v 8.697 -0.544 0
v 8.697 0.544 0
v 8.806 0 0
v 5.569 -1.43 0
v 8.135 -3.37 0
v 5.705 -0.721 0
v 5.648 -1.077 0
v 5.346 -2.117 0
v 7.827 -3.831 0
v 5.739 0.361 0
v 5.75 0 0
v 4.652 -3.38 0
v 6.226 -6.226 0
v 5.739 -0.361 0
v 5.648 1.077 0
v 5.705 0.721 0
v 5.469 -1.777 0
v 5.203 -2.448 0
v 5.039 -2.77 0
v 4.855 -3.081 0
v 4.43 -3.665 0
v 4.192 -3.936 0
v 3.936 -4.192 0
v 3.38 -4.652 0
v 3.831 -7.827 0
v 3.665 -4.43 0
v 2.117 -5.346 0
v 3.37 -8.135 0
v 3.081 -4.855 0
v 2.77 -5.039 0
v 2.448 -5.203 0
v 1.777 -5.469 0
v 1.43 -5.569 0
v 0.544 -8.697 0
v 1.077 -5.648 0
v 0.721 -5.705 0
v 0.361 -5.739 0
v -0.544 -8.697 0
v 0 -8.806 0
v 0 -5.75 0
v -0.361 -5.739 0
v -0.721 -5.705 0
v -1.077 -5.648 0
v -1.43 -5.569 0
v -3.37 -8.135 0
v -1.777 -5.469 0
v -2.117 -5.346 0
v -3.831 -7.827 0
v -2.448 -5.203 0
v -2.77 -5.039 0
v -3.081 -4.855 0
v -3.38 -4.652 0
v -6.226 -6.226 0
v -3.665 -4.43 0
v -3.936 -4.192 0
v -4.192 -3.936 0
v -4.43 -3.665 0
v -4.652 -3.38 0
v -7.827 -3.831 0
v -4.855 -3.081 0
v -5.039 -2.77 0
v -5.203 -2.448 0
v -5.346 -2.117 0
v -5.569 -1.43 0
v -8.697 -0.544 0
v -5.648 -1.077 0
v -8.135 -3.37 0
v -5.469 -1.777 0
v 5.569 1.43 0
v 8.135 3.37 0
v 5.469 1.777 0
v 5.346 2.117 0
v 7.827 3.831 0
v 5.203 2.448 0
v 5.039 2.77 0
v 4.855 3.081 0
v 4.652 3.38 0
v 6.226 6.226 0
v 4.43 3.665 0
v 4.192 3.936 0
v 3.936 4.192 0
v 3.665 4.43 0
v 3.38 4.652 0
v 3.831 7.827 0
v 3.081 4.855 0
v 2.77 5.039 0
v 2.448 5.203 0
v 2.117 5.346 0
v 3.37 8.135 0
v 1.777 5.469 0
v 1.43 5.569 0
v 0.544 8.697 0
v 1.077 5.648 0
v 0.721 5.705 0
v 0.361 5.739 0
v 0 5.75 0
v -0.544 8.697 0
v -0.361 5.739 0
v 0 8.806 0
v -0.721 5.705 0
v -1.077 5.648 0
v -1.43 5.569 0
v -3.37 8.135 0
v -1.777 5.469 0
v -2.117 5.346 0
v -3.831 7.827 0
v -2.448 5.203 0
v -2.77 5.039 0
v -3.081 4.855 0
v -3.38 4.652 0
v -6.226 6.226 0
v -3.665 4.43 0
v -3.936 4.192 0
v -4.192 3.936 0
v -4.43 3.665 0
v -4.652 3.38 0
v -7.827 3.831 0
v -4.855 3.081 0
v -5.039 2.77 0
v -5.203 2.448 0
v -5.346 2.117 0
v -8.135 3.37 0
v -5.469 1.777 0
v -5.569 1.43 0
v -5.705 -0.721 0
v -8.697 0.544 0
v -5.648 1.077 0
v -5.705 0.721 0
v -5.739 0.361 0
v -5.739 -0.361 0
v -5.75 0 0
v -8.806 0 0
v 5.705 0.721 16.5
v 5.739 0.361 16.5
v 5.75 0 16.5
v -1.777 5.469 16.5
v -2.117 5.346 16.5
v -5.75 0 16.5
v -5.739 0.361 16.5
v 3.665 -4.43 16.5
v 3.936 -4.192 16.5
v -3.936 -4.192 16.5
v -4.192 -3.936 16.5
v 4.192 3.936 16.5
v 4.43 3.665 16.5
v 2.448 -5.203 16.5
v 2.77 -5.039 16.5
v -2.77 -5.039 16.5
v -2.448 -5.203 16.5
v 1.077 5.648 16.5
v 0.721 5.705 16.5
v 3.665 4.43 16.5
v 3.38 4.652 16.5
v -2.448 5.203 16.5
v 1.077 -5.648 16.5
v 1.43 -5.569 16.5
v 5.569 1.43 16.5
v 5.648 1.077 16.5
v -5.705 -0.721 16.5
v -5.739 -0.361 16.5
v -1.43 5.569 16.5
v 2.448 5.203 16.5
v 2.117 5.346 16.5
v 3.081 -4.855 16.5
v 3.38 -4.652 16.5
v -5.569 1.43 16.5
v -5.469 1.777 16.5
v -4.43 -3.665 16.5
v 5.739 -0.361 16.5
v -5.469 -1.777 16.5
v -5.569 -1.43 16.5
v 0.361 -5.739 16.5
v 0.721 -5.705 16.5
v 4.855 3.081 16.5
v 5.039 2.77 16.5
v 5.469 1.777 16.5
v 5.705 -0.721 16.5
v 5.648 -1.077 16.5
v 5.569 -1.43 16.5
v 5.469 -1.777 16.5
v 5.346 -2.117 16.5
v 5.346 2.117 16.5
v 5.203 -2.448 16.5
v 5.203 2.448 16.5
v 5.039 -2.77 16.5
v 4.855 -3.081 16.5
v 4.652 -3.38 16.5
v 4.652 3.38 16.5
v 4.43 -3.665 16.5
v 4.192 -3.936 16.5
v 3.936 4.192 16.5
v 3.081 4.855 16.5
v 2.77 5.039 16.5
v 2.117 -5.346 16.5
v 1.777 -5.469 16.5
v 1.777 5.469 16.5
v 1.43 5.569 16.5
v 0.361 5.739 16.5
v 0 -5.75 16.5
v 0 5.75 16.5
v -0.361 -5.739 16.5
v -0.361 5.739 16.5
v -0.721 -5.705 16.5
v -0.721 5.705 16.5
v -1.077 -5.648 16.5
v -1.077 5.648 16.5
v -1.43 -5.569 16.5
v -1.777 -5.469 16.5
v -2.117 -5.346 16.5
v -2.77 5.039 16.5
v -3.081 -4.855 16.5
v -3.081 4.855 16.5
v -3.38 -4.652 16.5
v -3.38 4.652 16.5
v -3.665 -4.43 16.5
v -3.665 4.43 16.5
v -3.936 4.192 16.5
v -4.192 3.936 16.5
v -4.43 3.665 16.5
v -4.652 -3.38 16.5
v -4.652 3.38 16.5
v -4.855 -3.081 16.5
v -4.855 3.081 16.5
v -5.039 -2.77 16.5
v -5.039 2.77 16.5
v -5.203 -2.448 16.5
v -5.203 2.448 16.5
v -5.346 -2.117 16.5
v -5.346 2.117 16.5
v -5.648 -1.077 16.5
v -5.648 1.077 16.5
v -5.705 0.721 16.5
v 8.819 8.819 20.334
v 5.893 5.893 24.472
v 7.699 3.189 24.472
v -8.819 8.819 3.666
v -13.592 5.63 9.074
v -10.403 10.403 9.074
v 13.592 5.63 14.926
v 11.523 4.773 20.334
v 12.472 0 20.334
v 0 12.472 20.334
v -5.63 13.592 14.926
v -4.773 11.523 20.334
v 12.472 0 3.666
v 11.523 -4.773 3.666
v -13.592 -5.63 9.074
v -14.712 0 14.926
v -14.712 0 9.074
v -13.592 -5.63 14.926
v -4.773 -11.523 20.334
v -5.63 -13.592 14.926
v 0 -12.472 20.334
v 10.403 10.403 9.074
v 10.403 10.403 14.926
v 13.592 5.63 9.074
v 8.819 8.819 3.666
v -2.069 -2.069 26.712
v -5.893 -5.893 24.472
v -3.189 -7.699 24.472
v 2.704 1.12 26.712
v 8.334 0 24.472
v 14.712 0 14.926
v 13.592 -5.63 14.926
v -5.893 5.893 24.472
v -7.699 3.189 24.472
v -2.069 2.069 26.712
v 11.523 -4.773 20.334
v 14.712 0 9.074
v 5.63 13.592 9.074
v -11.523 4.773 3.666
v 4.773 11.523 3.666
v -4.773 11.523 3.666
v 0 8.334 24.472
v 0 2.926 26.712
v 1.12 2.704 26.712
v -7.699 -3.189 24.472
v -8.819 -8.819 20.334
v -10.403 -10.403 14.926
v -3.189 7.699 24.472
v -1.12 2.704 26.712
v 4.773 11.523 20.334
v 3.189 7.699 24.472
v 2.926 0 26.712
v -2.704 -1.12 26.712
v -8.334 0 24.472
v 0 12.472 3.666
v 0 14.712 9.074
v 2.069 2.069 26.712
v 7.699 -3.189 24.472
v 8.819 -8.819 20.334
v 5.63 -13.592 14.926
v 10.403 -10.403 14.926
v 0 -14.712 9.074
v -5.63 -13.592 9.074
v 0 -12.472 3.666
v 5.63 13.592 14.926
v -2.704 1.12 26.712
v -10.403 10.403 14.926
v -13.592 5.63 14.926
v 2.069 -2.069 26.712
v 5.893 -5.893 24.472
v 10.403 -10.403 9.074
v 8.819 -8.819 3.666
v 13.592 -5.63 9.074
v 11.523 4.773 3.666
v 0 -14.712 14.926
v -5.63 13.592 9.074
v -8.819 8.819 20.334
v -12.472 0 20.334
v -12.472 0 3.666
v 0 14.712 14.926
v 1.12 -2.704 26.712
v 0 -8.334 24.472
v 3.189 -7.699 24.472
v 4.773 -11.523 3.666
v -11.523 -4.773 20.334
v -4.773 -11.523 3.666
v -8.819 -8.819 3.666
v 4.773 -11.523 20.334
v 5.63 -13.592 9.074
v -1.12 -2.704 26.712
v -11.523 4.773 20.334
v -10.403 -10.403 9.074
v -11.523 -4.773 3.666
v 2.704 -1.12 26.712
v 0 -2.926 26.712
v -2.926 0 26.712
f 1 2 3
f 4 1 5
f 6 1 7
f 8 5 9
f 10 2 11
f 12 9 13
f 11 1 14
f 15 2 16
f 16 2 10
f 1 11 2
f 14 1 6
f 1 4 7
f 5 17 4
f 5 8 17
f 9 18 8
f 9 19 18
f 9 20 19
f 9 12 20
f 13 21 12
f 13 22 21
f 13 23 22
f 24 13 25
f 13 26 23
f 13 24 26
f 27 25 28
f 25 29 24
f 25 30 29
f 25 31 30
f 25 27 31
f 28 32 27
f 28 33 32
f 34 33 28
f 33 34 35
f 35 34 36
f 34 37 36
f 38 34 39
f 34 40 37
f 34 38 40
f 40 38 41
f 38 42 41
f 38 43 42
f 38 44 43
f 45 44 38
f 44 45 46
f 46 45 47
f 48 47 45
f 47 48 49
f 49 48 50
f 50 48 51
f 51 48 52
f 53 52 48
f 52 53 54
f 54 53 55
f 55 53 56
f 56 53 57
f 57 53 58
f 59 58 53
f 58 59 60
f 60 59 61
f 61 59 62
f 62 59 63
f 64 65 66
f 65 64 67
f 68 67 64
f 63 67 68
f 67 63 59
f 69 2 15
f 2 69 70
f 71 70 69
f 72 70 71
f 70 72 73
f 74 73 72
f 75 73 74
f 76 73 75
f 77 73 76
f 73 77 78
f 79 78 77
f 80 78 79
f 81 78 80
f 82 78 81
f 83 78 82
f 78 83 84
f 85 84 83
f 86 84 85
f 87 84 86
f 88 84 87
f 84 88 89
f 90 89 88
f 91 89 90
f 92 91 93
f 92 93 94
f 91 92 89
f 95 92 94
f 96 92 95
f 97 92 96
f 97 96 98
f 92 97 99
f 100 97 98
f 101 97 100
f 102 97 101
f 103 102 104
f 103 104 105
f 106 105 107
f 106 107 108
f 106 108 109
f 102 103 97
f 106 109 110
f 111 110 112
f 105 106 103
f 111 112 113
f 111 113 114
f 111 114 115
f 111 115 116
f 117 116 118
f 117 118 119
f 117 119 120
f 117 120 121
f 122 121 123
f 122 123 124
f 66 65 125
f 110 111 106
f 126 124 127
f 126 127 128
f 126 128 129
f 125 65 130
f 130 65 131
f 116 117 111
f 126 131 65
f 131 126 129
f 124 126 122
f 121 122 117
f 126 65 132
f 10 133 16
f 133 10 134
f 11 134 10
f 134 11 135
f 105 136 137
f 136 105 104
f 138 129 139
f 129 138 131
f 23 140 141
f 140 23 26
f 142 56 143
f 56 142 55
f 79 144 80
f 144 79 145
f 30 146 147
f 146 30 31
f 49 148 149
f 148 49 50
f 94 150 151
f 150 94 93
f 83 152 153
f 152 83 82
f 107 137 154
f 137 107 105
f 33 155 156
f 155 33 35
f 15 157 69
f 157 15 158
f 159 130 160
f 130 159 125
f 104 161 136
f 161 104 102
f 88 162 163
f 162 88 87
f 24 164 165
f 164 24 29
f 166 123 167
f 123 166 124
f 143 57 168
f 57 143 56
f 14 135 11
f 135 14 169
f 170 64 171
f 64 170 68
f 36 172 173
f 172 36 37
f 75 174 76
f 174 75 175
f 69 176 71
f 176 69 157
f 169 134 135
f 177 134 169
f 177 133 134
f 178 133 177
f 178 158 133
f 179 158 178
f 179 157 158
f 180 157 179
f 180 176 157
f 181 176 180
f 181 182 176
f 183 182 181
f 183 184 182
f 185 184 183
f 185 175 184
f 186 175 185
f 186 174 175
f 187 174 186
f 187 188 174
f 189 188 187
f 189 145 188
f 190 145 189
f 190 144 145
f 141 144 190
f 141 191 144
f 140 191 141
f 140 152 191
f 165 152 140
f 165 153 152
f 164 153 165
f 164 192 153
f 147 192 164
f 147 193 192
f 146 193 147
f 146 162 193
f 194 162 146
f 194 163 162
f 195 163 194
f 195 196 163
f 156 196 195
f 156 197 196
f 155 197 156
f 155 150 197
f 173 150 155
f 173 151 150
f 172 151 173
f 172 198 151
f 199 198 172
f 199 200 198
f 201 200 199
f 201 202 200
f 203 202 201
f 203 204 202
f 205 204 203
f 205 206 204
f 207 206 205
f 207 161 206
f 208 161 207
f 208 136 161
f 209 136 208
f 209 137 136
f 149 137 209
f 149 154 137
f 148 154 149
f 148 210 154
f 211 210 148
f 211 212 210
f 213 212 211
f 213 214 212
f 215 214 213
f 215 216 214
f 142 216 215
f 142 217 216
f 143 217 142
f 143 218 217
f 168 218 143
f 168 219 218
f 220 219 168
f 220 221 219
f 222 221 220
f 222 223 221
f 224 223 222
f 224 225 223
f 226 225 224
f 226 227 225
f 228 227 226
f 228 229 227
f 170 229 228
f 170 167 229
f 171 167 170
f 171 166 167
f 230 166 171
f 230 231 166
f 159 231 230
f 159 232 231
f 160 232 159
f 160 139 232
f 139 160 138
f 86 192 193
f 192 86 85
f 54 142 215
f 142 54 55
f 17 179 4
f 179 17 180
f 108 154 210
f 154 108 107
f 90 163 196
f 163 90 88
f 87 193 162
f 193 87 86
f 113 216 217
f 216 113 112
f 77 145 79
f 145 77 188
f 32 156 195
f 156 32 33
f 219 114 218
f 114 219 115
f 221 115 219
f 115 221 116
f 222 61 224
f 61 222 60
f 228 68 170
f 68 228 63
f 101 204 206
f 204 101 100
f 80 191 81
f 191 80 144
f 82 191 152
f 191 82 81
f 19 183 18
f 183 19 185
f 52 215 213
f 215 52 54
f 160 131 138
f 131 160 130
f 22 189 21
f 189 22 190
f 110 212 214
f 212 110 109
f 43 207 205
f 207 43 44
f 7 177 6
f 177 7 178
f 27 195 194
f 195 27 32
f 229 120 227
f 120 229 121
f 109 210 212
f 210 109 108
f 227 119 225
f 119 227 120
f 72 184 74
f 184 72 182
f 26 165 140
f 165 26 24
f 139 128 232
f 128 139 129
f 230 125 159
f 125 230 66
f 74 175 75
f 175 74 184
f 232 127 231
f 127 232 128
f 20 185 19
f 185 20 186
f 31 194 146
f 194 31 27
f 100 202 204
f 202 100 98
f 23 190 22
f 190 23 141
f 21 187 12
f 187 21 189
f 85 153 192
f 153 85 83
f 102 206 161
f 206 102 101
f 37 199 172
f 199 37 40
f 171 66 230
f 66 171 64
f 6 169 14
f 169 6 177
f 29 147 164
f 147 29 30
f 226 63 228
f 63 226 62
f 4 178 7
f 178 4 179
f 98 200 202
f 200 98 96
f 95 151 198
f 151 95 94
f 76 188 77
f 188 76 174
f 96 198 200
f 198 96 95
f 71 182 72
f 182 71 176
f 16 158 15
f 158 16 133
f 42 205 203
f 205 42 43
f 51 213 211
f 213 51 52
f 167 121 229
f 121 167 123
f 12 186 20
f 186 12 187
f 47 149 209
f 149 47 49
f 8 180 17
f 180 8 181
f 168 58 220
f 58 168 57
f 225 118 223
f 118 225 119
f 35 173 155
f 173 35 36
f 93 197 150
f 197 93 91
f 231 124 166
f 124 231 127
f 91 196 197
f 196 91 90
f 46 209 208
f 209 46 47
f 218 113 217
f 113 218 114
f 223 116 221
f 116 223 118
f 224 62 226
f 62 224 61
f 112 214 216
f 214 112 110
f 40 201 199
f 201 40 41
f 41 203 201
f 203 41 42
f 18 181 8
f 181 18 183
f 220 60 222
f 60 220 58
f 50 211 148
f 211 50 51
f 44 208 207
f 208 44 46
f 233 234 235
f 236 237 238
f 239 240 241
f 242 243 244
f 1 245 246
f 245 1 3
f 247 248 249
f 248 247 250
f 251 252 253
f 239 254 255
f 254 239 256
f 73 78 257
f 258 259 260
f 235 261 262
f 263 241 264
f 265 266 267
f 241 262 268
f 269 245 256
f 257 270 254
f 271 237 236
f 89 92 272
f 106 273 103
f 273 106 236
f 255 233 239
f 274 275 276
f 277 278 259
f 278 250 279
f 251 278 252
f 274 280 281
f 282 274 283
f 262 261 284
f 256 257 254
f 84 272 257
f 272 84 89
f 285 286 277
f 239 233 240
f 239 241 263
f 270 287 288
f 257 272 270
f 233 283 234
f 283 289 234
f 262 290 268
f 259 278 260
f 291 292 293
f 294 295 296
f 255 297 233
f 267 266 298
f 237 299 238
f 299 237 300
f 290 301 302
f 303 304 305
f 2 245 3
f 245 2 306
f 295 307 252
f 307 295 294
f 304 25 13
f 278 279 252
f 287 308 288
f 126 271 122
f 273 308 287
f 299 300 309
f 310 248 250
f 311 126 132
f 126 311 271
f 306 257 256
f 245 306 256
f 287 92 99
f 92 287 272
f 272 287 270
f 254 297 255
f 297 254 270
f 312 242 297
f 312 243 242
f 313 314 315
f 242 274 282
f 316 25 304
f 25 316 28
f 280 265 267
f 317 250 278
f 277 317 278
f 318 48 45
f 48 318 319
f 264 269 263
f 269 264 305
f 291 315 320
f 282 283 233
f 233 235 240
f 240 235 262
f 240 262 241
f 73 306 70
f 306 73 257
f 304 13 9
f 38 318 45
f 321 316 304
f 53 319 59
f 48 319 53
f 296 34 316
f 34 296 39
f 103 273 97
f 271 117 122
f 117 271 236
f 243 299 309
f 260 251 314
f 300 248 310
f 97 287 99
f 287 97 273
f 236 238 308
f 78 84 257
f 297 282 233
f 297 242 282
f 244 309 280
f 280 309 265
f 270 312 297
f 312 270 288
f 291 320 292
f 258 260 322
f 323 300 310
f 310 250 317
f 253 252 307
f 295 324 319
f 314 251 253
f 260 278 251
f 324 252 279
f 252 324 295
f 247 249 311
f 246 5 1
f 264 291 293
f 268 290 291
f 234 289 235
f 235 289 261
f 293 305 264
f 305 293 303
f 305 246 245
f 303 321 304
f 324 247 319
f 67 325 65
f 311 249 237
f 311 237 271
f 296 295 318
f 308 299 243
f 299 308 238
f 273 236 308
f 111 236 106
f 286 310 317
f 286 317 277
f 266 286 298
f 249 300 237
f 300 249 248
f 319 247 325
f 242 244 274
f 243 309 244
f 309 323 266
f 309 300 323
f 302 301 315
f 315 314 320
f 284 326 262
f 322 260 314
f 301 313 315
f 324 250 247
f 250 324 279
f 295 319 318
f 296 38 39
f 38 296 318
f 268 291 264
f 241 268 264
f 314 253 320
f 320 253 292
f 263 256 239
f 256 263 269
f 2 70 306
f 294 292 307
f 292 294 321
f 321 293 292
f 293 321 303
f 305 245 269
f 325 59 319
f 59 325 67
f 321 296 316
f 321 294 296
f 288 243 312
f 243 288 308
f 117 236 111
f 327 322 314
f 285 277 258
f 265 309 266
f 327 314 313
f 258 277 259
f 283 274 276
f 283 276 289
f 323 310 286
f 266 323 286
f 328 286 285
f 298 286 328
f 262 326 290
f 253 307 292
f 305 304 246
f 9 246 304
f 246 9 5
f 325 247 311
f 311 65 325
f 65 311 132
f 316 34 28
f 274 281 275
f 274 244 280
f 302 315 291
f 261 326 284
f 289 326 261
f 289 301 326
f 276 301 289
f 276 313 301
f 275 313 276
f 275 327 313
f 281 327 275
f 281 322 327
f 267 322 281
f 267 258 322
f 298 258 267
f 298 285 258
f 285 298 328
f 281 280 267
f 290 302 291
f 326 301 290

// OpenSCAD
// A spherical knob for applications like covering the end of a bolt or handle.
// Size the hole smaller than what it will fit on, and drill or tap it to the exact size.

// Diameter of sphere
sphereDiameter = 30;

// Diameter of hole
holeDiameter = 11.5;

// Depth of hole
holeDepth = 18;

// Depth of flattening on hole side
flatDepth = 3;

// Assemble Rounded Knob

difference() {
// Sphere
        translate([0, 0, (sphereDiameter/2)-flatDepth]) {
                sphere(d = sphereDiameter,$fn=16);
        }
// Cut out
        translate([0,0,-flatDepth/2]){
                cylinder(h = flatDepth, d = sphereDiameter,center = true);
                translate([0,0,-flatDepth]){
                        cylinder(h = holeDepth+flatDepth, d = holeDiameter, center = false, $fn=100);
                }
        }
}
